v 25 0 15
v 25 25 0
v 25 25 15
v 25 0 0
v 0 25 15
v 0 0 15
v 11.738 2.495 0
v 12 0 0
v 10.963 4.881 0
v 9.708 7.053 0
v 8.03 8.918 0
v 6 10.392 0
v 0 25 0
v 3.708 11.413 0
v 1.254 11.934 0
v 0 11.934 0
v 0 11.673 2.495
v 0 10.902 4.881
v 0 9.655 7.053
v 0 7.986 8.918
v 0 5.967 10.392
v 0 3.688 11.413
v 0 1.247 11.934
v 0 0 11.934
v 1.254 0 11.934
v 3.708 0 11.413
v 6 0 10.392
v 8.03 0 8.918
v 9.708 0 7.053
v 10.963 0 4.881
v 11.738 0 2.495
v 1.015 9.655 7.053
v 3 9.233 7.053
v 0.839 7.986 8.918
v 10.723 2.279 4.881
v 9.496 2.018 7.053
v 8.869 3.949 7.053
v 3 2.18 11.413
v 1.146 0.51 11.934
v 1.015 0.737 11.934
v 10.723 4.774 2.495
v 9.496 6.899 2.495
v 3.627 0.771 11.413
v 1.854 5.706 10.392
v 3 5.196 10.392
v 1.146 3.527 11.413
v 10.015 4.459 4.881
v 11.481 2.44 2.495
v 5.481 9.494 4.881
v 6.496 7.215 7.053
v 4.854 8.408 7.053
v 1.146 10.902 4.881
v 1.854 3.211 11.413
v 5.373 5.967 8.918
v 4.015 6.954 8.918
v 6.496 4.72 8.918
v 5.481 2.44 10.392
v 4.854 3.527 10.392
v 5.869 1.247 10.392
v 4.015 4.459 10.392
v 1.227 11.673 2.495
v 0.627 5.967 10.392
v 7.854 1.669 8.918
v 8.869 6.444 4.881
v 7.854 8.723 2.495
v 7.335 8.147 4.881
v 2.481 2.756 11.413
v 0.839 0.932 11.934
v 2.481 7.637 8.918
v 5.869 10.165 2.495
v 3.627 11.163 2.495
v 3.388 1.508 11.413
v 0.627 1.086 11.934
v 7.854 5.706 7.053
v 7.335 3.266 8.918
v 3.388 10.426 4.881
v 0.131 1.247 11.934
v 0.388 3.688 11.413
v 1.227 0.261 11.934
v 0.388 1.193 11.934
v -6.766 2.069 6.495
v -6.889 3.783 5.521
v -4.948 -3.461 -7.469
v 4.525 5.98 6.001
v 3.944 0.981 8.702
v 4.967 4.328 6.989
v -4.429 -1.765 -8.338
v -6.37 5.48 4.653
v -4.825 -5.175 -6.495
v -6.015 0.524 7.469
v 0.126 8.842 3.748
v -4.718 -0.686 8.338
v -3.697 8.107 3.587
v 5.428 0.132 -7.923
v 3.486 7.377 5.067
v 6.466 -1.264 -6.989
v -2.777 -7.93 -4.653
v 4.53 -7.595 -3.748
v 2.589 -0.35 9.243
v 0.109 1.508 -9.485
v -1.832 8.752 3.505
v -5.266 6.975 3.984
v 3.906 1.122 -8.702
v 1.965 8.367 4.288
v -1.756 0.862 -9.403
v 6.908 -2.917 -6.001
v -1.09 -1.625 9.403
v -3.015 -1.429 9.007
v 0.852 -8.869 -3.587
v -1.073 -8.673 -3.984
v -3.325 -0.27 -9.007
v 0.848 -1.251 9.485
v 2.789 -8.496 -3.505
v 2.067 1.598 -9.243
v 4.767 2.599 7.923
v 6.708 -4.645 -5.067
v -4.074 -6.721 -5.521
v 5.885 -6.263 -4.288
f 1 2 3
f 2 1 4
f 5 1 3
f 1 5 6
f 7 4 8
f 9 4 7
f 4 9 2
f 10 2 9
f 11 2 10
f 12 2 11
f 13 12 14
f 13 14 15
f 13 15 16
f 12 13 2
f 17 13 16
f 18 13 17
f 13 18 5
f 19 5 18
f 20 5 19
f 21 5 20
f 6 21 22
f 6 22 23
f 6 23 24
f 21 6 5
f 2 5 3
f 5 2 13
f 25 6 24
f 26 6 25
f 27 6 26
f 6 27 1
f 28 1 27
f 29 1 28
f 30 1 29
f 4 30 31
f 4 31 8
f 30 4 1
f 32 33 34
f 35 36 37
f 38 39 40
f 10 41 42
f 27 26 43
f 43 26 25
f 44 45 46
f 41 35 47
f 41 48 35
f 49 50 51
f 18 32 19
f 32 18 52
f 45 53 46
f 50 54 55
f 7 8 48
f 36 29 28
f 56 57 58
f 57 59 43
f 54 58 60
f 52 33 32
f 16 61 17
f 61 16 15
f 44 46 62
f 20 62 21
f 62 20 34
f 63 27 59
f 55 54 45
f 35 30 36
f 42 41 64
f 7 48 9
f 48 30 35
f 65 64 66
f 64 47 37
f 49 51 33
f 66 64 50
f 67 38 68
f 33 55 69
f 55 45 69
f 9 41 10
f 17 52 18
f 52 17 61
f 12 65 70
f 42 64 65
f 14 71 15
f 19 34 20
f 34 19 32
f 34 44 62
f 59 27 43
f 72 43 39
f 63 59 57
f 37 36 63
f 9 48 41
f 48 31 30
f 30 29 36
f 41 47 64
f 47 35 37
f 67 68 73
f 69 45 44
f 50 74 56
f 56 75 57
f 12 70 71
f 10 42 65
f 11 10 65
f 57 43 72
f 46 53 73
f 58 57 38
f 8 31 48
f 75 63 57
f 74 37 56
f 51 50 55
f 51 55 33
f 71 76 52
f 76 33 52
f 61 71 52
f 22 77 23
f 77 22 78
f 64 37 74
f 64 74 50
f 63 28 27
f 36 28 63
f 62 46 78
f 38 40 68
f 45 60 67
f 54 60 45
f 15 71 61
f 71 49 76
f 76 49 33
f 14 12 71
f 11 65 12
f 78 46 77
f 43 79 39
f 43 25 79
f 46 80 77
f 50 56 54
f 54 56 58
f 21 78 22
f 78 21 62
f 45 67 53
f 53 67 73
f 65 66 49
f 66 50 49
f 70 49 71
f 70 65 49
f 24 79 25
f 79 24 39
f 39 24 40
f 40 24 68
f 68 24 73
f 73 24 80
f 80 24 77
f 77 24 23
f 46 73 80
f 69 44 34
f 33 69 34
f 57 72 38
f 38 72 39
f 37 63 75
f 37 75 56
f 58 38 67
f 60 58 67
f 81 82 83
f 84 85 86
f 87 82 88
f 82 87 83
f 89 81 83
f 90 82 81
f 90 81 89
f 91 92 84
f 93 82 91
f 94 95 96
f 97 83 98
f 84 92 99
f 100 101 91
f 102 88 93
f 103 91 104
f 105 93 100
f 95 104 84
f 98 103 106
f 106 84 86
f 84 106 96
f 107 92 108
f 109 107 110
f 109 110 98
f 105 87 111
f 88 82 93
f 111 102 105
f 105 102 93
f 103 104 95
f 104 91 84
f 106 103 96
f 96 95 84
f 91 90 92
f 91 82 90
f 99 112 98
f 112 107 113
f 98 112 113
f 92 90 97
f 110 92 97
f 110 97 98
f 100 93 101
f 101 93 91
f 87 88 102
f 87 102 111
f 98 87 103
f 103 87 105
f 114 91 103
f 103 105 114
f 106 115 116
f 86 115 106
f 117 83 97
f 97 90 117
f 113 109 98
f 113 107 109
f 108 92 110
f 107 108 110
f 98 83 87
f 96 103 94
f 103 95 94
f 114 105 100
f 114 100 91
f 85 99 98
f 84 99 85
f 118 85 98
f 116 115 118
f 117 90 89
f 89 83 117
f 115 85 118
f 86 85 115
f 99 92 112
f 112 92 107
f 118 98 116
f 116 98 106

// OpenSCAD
// Generated by generate_scads.py
union() {
  difference() {
    cube(size=[25,25,15], center=false);
    sphere(r=12);
  }
  rotate([30,180,15]) {
    cylinder(h=15, r=6, center=true);
  }
}
